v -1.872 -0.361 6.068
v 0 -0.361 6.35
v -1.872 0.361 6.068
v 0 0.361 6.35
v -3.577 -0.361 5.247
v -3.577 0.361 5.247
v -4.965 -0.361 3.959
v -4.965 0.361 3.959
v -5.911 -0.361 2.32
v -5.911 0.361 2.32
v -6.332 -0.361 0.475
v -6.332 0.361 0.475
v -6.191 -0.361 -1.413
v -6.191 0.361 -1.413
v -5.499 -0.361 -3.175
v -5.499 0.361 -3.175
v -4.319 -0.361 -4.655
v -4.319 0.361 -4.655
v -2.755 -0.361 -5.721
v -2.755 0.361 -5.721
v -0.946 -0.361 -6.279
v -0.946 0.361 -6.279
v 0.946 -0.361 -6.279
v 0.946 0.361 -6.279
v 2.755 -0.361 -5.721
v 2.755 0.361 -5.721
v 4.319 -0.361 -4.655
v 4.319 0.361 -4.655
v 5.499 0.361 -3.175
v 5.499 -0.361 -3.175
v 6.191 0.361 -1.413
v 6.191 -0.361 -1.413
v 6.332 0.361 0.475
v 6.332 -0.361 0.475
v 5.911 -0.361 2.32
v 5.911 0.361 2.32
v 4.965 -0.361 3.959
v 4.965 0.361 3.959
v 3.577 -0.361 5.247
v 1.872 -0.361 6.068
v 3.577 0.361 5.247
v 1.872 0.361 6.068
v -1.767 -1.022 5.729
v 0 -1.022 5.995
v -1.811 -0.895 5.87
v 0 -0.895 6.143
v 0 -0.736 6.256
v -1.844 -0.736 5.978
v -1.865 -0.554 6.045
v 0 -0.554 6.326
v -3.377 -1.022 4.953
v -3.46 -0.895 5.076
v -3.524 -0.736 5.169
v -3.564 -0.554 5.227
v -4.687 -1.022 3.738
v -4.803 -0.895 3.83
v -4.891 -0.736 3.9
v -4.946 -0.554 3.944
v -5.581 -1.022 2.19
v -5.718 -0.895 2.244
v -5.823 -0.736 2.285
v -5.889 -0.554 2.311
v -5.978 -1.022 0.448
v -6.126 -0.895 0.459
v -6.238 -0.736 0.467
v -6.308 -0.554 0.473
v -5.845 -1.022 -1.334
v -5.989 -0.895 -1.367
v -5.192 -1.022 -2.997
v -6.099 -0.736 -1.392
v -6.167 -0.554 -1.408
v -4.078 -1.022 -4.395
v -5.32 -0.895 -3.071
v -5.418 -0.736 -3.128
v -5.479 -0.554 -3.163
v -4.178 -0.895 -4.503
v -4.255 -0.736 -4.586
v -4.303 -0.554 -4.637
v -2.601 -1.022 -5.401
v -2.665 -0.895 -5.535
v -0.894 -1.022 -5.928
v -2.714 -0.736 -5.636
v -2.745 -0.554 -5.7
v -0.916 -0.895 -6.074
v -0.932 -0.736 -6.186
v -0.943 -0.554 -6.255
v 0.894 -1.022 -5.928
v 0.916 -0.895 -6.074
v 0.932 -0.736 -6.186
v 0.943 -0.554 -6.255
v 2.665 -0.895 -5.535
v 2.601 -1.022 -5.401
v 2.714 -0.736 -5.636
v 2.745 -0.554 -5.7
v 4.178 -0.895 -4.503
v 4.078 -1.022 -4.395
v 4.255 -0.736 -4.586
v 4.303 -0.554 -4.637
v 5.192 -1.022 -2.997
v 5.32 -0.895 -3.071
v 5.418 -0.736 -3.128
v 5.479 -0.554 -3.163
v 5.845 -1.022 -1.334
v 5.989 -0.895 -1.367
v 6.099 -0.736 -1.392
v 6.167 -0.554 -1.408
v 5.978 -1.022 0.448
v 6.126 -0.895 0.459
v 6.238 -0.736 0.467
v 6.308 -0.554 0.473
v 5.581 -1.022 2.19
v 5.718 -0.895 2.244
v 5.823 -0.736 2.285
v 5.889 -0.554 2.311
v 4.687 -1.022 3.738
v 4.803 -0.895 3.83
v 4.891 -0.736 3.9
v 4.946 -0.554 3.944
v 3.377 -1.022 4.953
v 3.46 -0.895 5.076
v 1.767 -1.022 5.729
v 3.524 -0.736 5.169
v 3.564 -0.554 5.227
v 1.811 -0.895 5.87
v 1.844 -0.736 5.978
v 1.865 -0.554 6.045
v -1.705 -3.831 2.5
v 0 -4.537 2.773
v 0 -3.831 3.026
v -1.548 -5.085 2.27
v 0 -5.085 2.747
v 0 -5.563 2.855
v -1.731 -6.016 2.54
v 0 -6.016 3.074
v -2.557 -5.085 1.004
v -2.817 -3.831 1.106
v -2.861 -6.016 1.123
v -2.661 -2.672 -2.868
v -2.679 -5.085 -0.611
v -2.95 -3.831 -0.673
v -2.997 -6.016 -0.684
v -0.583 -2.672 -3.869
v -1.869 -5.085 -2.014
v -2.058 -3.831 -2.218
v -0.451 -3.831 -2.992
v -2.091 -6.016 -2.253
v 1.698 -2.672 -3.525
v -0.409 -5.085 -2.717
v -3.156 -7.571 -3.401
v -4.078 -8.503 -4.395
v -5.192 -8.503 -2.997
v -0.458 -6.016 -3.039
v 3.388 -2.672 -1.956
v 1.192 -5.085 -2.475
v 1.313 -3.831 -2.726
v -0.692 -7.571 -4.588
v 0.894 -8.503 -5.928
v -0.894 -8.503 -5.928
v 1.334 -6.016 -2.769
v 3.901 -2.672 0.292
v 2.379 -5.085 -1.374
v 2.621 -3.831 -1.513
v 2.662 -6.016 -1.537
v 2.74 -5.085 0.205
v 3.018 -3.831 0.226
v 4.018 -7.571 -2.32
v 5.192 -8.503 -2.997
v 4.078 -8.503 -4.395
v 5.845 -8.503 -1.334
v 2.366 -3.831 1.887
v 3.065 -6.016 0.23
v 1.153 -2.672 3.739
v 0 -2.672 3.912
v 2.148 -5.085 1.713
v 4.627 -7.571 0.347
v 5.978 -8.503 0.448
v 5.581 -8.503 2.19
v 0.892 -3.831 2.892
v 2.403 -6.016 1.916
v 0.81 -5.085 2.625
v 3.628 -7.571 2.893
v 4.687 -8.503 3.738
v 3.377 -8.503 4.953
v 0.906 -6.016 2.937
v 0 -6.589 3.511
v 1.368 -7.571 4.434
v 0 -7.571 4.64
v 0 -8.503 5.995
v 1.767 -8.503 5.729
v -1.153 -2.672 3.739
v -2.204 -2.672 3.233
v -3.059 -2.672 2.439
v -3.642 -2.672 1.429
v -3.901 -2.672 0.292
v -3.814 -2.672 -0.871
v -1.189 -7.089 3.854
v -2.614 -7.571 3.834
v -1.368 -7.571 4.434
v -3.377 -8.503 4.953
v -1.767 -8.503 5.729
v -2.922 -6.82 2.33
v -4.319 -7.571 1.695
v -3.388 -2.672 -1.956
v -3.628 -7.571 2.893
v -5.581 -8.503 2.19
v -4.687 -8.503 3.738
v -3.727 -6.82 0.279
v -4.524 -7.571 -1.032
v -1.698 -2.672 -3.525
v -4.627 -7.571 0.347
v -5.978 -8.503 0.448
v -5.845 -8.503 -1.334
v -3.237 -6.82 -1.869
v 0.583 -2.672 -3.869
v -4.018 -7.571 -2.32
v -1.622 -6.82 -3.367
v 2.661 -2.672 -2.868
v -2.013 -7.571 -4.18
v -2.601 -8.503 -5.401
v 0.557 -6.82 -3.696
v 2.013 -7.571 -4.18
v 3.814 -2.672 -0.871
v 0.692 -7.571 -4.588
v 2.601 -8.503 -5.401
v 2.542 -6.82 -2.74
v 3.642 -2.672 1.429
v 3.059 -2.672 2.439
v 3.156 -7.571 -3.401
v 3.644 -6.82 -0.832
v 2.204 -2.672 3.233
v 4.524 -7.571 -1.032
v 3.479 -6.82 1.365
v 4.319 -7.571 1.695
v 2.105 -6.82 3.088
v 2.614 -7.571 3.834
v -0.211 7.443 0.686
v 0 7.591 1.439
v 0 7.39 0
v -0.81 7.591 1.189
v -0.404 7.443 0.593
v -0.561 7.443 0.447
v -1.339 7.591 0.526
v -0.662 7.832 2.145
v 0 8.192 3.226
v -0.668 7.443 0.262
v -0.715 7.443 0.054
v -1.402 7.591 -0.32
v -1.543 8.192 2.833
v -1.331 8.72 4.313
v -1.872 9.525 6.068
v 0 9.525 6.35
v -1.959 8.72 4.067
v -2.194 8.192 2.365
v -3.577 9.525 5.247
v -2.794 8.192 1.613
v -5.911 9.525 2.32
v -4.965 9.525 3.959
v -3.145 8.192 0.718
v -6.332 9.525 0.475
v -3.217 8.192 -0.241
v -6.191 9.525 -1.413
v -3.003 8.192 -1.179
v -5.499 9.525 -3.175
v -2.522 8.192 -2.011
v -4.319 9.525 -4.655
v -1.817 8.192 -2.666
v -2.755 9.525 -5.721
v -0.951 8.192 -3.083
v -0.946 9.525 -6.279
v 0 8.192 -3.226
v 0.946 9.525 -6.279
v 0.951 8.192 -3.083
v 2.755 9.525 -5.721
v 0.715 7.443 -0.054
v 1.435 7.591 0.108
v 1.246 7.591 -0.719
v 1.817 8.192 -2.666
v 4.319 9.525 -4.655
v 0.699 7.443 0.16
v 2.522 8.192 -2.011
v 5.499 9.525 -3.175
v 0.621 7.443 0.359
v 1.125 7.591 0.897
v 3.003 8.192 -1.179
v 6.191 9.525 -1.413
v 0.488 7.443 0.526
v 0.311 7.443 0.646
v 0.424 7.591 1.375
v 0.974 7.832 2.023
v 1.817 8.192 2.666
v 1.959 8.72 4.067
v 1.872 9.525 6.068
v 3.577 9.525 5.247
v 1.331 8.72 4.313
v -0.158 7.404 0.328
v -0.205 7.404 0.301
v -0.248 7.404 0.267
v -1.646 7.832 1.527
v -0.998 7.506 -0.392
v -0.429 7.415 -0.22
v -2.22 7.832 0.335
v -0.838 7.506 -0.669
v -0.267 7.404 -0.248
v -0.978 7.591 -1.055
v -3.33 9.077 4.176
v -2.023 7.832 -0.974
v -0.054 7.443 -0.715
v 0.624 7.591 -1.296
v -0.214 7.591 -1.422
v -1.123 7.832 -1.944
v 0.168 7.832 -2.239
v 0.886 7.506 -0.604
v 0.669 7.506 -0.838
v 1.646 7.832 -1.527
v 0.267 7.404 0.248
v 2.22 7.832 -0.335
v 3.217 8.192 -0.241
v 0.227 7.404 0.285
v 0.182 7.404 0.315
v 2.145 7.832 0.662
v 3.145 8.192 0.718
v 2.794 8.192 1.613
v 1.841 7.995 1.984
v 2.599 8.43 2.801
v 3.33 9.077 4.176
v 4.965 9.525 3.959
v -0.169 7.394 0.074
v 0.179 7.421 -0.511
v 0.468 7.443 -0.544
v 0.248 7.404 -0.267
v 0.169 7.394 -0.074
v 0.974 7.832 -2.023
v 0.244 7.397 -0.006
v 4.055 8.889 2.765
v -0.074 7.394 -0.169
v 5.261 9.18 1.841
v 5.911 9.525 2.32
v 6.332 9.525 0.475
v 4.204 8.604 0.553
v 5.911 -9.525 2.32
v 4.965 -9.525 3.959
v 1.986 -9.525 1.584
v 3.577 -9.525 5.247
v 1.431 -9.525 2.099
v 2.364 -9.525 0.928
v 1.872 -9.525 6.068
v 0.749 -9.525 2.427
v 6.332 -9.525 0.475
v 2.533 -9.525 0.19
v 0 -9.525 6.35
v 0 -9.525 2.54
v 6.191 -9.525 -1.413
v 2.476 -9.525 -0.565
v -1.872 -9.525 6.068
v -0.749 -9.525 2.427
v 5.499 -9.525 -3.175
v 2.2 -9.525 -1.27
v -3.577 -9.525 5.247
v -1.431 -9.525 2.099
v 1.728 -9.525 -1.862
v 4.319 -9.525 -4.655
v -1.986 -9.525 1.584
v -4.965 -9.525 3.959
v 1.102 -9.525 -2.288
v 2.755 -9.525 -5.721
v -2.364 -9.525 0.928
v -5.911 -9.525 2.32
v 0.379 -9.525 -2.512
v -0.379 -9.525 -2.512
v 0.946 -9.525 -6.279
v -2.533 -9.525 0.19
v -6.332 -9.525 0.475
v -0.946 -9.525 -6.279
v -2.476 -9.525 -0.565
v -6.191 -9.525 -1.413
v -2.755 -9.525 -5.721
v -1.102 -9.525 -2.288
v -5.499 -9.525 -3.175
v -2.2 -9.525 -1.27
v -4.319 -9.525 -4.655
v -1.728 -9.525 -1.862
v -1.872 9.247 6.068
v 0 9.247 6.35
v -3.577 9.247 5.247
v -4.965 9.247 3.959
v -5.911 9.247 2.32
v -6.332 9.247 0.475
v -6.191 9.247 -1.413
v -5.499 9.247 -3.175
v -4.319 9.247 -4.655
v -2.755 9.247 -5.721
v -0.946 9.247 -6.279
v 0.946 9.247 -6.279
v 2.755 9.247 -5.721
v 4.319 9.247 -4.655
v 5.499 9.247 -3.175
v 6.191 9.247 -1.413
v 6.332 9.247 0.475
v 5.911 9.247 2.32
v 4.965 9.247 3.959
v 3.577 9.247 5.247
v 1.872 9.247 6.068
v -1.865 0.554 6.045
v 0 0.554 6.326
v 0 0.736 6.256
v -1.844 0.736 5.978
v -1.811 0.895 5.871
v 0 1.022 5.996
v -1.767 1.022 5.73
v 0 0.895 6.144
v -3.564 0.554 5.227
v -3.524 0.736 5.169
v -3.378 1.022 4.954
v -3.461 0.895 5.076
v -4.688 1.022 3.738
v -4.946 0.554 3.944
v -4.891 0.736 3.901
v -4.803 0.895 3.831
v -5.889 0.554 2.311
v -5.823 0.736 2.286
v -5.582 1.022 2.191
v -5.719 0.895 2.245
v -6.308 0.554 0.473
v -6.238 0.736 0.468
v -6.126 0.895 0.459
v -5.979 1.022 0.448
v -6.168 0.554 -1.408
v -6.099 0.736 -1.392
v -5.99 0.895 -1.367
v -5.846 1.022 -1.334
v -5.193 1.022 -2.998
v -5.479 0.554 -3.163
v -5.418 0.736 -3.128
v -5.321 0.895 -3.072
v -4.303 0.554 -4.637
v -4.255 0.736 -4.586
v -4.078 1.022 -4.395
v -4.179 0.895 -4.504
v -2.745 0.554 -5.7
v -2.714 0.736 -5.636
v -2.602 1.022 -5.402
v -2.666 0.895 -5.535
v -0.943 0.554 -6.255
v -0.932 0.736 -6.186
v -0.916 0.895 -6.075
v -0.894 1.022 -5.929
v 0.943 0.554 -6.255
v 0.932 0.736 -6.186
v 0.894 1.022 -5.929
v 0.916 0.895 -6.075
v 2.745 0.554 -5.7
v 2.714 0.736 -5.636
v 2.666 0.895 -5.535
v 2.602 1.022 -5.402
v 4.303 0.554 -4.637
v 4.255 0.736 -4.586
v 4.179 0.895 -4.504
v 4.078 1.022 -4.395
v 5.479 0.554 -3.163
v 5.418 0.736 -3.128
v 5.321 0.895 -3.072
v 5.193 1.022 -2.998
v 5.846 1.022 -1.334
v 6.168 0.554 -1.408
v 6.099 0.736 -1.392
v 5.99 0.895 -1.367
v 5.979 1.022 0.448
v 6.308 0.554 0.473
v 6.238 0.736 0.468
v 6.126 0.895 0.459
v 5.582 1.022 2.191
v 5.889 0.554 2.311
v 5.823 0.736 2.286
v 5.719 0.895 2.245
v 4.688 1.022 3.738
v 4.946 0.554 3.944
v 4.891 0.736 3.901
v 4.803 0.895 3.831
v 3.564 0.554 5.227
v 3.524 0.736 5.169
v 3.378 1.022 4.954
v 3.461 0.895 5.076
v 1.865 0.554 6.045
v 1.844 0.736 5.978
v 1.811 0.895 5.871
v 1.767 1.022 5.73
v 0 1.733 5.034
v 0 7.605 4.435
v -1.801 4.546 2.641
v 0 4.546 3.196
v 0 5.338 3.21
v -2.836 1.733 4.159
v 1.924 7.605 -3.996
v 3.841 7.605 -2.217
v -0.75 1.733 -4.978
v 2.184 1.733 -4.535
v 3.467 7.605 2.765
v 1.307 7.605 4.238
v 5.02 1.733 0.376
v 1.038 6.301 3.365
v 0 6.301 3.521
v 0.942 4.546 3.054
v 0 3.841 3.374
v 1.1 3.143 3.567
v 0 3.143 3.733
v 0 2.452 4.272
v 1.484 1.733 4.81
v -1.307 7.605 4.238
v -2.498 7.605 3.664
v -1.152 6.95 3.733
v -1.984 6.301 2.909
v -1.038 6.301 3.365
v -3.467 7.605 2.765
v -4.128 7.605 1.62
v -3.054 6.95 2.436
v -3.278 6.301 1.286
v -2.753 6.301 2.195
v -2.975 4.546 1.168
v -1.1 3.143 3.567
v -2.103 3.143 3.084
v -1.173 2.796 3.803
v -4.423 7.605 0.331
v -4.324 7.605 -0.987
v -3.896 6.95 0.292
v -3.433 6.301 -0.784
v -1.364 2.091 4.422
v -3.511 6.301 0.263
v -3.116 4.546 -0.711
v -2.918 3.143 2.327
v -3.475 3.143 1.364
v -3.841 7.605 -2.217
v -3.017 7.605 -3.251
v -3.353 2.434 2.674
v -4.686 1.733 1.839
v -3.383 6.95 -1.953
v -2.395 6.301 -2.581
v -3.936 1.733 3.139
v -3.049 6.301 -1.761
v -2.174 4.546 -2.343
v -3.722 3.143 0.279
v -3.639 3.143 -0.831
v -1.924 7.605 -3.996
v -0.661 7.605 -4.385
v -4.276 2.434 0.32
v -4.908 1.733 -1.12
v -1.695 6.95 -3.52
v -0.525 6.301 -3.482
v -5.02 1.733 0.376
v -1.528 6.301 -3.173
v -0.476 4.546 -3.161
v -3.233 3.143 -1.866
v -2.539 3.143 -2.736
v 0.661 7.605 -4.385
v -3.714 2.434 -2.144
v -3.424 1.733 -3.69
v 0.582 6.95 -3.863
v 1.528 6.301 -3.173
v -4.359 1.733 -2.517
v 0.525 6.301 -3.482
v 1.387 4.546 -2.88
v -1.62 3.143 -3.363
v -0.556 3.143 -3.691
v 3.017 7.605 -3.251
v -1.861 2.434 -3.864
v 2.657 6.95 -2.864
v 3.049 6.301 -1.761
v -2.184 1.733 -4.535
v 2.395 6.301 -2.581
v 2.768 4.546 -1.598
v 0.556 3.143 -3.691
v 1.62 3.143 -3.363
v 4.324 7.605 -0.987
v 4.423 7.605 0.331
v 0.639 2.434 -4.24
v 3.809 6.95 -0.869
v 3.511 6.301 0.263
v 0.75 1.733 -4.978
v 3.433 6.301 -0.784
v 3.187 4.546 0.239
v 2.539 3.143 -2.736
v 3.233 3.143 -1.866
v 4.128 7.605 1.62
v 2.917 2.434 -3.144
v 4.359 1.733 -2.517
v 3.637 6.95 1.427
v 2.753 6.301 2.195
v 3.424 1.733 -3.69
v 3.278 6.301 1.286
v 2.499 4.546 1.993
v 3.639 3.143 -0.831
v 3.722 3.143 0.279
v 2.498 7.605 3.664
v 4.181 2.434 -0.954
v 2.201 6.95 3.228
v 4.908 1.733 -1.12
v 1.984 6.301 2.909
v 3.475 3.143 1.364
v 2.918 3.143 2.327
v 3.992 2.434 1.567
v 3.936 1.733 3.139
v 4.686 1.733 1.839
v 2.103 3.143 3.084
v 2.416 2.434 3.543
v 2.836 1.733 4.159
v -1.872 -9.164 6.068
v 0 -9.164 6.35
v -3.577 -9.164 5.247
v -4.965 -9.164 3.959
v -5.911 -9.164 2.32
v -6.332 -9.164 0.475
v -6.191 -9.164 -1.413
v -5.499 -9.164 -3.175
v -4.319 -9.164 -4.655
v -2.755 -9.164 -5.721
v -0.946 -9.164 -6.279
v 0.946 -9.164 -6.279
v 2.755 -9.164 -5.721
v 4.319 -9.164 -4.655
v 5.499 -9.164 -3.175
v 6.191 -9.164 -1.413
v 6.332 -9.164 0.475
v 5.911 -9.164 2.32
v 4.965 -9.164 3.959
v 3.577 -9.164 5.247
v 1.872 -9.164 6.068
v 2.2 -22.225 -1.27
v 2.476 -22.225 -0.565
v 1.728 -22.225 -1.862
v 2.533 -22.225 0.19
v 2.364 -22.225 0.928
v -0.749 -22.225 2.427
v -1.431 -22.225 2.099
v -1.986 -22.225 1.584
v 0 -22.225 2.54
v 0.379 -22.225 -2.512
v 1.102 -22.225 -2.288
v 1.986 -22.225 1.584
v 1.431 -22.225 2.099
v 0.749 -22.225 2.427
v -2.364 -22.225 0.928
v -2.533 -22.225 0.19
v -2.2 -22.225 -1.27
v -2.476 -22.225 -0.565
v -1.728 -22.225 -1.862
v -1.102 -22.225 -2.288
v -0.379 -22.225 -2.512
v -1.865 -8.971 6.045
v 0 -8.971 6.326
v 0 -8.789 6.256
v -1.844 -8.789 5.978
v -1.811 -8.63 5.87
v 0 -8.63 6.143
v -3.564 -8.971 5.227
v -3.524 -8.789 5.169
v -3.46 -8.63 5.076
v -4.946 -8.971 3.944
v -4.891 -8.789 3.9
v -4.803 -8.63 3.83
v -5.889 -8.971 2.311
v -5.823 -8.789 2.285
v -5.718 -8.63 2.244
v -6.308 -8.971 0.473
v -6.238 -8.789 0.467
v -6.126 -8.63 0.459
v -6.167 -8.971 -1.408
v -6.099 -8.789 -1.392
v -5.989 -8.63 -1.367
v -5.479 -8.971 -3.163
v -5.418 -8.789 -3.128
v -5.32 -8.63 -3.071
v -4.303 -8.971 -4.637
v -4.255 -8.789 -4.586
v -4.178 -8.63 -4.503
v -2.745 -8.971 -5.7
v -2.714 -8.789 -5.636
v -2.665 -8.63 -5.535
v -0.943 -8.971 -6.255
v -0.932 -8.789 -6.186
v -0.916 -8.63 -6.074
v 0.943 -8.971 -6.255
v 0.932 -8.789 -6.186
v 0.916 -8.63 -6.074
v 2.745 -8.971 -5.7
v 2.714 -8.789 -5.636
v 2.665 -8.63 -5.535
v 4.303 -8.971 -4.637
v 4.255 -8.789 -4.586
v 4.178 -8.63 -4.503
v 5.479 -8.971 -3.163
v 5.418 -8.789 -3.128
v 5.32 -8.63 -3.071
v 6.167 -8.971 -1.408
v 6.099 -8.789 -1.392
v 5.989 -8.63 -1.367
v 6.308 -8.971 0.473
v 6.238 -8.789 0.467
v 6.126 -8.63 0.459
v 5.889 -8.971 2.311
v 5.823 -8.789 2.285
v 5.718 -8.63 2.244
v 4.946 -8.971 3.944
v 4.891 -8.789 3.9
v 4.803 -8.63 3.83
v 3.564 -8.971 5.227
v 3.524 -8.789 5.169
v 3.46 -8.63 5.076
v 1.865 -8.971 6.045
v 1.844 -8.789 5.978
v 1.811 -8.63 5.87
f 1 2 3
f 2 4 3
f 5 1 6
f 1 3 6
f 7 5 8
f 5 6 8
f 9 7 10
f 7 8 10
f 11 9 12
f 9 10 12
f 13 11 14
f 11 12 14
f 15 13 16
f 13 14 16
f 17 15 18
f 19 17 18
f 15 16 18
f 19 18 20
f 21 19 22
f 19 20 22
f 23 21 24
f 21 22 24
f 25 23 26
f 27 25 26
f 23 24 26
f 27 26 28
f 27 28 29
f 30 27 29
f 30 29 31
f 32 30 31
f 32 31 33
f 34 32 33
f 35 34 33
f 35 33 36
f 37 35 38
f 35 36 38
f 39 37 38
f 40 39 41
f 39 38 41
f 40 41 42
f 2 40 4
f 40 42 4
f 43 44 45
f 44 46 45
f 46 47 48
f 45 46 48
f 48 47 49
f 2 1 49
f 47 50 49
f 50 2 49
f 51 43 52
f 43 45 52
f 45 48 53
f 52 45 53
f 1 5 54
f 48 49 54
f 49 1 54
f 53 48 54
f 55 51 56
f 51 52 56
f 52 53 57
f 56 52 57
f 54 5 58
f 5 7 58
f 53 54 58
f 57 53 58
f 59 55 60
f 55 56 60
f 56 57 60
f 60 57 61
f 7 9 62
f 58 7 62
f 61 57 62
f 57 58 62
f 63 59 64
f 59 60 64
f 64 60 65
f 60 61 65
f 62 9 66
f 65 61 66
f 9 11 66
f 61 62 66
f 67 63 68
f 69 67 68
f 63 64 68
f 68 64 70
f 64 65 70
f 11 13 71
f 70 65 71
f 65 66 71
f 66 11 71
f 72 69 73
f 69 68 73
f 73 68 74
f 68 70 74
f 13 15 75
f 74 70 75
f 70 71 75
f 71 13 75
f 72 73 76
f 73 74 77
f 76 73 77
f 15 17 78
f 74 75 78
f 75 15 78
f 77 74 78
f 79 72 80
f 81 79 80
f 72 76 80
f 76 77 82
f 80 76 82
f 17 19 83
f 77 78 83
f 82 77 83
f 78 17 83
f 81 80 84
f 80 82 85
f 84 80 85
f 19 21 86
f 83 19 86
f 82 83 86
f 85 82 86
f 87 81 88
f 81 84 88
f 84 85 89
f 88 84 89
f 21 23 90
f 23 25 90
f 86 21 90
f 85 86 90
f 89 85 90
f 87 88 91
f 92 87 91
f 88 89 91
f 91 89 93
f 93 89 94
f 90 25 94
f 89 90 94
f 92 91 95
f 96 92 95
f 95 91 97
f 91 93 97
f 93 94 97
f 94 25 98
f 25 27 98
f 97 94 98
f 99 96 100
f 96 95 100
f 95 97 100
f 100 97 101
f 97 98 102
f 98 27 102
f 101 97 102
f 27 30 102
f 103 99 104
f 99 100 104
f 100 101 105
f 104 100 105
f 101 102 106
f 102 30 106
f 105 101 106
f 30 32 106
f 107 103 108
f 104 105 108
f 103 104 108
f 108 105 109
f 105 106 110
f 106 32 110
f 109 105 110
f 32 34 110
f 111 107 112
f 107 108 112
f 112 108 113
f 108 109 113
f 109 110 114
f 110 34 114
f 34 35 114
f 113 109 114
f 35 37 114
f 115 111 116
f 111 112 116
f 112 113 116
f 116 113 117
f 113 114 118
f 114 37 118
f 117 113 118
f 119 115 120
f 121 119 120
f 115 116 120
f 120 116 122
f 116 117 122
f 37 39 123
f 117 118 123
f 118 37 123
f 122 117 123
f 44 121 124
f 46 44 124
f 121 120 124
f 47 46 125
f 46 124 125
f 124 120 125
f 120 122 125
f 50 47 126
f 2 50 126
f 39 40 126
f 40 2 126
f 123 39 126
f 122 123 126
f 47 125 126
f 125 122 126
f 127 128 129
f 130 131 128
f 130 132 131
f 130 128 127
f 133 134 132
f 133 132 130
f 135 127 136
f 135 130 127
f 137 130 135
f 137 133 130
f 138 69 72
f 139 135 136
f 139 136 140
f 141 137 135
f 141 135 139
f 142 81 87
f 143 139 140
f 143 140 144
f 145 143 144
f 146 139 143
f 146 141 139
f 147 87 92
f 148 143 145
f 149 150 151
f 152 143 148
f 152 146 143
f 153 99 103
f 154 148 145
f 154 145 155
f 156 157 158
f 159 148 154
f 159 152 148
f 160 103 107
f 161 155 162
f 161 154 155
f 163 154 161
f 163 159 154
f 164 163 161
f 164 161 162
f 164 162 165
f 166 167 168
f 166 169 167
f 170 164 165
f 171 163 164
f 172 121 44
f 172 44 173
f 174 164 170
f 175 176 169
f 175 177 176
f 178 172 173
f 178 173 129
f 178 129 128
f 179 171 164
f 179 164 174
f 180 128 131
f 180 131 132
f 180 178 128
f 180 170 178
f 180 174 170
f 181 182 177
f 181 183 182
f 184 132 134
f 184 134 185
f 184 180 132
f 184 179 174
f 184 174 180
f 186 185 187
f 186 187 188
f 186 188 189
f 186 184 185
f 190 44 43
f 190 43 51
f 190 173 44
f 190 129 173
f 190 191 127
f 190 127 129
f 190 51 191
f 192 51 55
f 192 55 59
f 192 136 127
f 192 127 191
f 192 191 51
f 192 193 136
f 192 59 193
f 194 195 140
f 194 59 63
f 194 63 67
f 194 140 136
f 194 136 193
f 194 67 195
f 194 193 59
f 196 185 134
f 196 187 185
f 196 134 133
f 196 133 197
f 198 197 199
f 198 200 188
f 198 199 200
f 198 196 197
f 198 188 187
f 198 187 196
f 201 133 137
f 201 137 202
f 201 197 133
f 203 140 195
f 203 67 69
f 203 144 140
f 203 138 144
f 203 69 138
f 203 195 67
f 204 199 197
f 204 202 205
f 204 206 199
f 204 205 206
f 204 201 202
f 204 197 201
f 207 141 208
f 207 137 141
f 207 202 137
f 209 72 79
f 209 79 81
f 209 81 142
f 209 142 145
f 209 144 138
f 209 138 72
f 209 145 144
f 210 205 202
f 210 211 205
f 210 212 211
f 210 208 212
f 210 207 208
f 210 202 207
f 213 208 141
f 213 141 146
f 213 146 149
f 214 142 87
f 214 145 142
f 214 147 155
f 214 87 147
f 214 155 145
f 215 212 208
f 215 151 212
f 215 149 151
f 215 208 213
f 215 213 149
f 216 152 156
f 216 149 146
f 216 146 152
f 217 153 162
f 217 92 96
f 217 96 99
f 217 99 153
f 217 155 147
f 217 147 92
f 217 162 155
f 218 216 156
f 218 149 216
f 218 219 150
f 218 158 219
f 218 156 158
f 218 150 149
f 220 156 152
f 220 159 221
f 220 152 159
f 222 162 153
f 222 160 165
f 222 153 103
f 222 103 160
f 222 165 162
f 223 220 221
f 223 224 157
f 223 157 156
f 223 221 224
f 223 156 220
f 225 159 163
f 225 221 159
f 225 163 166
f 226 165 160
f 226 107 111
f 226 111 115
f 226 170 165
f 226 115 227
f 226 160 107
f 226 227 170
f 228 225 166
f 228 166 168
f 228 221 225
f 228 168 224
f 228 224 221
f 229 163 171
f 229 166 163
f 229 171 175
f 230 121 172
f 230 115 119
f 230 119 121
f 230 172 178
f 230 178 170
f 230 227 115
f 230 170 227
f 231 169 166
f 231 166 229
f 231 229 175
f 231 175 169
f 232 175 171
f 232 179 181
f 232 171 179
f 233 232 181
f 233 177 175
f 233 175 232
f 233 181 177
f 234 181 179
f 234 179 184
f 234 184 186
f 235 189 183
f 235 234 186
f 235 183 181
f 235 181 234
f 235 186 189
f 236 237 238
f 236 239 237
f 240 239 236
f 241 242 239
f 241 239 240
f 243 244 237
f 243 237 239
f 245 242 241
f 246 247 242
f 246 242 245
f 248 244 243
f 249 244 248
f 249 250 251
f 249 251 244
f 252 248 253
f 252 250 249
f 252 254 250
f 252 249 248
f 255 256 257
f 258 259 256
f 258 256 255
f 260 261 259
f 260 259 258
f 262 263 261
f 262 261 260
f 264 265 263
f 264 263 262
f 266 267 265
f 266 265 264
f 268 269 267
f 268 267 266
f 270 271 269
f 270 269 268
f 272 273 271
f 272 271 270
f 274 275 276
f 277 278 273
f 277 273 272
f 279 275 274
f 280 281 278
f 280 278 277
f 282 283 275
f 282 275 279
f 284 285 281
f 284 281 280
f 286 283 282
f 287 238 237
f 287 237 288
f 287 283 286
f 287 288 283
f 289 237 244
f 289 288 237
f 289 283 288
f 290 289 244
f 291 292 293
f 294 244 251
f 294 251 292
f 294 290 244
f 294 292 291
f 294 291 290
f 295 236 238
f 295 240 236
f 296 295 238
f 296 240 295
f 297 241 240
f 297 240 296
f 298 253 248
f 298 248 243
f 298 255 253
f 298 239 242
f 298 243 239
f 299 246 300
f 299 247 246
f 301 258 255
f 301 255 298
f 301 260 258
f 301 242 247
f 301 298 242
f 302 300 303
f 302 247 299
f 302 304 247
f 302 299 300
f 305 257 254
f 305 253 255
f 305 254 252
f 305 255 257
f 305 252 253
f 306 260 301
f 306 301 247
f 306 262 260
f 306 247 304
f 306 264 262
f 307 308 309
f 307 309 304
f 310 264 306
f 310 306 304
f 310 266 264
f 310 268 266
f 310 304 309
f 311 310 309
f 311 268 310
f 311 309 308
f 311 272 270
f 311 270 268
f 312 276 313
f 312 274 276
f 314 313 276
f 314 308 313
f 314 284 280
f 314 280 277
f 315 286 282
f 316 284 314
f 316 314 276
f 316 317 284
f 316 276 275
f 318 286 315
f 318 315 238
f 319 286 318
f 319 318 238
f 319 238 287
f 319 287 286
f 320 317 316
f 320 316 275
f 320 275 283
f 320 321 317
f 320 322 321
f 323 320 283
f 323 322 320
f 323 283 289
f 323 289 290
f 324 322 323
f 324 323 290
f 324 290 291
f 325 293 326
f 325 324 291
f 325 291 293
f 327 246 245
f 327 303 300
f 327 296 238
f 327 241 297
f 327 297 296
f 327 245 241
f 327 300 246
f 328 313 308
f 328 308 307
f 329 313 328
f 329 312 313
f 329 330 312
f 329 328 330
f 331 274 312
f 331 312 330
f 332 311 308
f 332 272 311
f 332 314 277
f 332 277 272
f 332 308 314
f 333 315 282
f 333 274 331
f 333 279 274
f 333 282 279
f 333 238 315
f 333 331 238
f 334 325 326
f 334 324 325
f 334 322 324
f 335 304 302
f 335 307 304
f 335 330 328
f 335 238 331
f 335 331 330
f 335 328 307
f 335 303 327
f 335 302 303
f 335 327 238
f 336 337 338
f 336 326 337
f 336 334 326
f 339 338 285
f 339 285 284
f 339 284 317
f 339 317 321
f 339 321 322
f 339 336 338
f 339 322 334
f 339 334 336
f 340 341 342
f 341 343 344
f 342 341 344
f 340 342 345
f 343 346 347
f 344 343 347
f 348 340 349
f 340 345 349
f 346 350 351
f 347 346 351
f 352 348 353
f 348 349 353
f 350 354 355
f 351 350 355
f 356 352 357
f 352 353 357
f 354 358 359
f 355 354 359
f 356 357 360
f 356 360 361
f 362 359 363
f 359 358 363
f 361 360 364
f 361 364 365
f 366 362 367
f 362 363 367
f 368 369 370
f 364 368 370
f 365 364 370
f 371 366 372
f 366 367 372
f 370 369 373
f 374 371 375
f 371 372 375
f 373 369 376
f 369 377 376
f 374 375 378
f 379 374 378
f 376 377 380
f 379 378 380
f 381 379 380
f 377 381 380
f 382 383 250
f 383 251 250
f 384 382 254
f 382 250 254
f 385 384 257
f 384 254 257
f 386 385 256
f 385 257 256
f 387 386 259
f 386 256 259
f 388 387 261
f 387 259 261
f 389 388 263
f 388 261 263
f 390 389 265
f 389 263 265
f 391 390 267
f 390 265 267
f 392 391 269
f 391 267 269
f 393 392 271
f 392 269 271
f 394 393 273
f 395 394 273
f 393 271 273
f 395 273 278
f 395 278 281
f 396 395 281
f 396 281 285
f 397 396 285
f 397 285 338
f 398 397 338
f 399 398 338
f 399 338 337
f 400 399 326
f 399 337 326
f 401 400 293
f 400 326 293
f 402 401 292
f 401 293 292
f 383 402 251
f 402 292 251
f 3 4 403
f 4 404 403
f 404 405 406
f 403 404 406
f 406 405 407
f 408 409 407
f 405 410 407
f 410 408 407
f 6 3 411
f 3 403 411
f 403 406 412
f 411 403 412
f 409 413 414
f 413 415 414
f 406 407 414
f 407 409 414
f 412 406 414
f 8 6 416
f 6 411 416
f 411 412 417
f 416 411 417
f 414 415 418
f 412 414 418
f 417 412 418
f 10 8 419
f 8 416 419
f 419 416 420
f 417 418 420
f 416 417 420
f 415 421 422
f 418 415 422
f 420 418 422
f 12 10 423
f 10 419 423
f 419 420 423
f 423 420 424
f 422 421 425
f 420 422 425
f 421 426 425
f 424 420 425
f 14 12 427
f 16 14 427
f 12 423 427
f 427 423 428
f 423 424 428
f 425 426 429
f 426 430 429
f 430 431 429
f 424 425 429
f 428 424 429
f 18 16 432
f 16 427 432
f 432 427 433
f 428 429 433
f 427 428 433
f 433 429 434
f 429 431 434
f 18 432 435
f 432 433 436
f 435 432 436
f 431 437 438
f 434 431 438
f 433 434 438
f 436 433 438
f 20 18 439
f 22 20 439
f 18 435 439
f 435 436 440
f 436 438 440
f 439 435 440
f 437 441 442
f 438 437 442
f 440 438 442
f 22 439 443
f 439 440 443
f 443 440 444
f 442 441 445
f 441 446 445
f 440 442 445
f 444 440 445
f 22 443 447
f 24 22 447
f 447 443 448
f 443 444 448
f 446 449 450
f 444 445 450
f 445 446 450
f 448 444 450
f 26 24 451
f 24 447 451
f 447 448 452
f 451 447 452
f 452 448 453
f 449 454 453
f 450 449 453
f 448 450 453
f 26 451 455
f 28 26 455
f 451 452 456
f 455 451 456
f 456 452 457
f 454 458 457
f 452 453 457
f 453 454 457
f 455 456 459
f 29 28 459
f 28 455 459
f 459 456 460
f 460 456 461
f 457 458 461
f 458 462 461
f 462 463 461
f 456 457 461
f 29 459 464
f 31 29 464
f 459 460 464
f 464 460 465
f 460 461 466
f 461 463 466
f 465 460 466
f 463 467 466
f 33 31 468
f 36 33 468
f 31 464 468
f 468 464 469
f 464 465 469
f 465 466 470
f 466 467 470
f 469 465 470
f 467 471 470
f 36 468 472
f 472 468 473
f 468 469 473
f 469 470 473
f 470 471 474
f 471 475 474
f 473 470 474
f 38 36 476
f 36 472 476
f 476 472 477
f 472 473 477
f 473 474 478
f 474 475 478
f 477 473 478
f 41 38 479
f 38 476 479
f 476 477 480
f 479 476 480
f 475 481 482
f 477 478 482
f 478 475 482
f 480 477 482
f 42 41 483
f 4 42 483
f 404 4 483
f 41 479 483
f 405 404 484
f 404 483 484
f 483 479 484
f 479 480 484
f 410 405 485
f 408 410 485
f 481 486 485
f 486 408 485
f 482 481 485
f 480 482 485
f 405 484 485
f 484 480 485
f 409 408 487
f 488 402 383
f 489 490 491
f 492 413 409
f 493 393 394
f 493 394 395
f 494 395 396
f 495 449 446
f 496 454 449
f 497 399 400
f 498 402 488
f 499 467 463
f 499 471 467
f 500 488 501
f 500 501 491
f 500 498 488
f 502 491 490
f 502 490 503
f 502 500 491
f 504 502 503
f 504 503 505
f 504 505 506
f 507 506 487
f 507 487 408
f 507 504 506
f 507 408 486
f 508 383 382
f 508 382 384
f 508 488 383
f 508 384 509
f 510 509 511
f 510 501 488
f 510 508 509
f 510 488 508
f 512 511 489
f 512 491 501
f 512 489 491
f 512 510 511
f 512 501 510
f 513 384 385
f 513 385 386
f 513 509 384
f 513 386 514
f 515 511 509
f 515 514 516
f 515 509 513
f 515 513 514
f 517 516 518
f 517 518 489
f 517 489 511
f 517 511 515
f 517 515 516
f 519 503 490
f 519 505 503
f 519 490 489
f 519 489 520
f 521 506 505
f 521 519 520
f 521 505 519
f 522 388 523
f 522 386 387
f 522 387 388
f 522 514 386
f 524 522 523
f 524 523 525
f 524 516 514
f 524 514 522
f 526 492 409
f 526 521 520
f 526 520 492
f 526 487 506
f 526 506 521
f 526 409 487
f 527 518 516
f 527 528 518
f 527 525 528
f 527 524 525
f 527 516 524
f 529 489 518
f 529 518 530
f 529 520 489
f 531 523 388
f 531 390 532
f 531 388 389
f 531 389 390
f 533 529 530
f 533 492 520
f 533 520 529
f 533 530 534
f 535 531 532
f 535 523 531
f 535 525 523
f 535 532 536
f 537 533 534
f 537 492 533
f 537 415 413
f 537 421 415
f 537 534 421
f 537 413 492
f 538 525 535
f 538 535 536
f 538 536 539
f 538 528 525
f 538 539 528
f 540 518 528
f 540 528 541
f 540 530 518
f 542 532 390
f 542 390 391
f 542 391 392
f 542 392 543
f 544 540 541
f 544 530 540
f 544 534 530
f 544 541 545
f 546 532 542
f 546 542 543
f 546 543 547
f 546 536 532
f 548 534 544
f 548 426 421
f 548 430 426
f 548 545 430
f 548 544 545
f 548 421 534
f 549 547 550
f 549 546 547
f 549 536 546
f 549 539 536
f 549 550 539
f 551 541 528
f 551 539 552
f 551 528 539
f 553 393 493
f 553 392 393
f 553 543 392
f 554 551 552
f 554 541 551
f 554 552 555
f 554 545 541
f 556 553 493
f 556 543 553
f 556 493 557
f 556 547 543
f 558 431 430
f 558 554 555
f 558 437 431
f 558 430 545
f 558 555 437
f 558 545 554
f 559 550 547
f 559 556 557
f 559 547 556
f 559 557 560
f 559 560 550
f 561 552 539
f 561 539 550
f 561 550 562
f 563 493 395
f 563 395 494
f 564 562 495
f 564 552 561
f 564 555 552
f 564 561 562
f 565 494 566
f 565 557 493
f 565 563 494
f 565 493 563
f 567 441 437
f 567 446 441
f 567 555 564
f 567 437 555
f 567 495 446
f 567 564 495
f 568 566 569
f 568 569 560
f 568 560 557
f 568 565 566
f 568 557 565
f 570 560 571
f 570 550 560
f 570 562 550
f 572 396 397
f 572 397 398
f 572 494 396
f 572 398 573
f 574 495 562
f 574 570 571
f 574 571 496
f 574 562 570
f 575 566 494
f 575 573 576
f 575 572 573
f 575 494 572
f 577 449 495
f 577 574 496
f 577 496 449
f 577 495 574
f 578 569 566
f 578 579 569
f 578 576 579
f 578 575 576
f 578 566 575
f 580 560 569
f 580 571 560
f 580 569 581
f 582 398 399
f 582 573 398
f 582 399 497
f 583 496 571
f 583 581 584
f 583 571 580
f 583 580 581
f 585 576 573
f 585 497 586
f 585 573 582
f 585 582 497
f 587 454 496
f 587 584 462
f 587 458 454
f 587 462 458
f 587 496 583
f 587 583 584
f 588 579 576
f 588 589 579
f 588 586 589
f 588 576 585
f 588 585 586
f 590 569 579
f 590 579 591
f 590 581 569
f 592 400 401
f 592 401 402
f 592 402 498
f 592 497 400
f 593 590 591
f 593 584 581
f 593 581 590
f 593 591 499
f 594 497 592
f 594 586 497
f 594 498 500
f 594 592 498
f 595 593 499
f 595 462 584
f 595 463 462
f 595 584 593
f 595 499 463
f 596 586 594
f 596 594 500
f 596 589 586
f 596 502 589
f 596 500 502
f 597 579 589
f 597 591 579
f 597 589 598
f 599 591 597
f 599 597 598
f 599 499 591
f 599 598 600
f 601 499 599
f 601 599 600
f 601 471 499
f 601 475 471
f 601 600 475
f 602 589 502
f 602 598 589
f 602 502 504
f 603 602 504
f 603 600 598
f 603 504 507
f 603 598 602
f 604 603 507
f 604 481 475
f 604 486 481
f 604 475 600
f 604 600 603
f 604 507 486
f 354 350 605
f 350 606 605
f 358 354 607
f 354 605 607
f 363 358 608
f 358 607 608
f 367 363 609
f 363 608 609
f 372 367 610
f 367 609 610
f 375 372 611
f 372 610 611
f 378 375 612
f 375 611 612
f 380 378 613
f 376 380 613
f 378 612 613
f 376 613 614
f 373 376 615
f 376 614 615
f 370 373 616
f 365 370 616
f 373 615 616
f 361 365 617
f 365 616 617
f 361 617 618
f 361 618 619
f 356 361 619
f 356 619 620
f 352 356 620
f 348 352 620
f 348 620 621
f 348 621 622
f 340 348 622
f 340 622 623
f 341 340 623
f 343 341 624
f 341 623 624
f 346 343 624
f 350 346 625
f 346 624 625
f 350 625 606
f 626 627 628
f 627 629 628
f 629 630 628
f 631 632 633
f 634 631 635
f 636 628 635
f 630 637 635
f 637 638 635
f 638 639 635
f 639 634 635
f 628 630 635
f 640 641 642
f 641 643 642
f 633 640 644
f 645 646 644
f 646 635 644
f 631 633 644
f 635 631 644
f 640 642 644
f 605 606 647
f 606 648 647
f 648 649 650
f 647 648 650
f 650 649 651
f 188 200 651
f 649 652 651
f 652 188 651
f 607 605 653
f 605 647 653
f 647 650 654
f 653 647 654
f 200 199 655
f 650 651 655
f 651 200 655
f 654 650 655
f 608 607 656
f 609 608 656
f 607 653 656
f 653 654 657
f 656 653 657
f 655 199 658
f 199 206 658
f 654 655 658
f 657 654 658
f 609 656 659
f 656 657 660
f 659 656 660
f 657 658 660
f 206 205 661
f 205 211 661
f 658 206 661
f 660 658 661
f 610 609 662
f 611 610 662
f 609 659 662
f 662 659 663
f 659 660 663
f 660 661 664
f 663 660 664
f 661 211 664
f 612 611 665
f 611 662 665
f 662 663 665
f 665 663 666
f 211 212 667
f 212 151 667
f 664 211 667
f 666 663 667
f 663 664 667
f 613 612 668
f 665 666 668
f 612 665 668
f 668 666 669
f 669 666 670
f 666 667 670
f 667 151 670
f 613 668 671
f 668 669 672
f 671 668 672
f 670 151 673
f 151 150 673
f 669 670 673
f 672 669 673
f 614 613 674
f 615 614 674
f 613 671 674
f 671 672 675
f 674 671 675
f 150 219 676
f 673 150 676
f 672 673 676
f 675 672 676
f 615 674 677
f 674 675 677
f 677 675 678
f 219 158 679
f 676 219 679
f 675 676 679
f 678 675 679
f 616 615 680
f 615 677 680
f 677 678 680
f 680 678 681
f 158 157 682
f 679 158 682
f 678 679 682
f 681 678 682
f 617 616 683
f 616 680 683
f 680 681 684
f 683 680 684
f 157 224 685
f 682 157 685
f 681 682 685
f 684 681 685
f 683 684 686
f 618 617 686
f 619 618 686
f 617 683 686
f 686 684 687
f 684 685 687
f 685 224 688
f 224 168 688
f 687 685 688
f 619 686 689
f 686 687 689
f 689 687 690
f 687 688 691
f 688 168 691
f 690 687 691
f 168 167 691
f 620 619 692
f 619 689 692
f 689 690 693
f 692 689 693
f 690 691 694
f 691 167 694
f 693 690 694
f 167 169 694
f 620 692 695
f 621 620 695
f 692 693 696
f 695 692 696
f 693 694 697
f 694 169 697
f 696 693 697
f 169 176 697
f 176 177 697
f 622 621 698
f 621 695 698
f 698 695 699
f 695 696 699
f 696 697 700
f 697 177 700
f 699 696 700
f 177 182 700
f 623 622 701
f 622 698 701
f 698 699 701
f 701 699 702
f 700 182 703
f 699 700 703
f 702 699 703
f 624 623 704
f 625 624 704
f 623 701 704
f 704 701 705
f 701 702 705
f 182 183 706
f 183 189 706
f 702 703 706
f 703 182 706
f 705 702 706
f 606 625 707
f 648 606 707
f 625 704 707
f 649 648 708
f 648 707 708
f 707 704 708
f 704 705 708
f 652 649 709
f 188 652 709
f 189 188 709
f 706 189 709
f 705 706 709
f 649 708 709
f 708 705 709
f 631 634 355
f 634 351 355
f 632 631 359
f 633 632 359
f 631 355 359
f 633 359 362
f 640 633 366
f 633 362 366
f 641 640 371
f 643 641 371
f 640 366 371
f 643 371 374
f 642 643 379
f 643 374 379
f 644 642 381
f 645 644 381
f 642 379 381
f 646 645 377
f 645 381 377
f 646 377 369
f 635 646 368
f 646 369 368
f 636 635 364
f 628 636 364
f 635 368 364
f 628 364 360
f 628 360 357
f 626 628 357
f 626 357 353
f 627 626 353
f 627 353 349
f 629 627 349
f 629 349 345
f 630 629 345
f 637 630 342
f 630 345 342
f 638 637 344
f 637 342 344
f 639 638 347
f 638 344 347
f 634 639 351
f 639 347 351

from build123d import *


with BuildPart() as part:
    # Sketch1 → Revolve1 (revolve)
    with BuildSketch(Plane(origin=(0, 0, 0), x_dir=(0, 0, -1), z_dir=(1, 0, 0)), mode=Mode.PRIVATE) as revolve1_sk:
        with BuildLine():
            Line((0, 7.390287575), (0, -9.525))
            Line((0, -9.525), (0, -22.225))
            Line((0, -22.225), (2.54, -22.225))
            Line((2.54, -22.225), (2.54, -9.525))
            Line((2.54, -9.525), (6.35, -9.525))
            Line((6.35, -9.525), (6.35, -9.164266132))
            ThreePointArc((6.35, -9.164266132), (6.25562596, -8.788883222), (5.994945312, -8.502763687))
            add(Edge.make_bspline(
                [(5.994945312, -1.022236313), (0.355054688, -4.7625), (3.175, -6.632631843), (5.994945312, -8.502763687)],
                knots=[0, 0, 0, 0, 1, 1, 1, 1], degree=3))
            ThreePointArc((5.994945312, -1.022236313), (6.25562596, -0.736116778), (6.35, -0.360733868))
            Line((6.35, -0.360733868), (6.35, 0.361159933))
            ThreePointArc((6.35, 0.361159933), (6.255931261, 0.735973481), (5.996021554, 1.021947374))
            add(Edge.make_bspline(
                [(6.35, 9.247051697), (0.182218111, 4.891187644), (5.996021554, 1.021947374)],
                knots=[0, 0, 0, 1, 1, 1], degree=2))
            Line((6.35, 9.247051697), (6.35, 9.525))
            add(Edge.make_bspline(
                [(0, 7.390287575), (1.5875, 7.390287575), (6.35, 9.525)],
                knots=[0, 0, 0, 1, 1, 1], degree=2, weights=[1, 1.414213562, 1]))
        make_face()
    revolve(revolve1_sk.sketch.rotate(Axis((0, -9.525, 0), (0, -1, 0)), 180), axis=Axis((0, -9.525, 0), (0, -1, 0)))


solid = part.part
